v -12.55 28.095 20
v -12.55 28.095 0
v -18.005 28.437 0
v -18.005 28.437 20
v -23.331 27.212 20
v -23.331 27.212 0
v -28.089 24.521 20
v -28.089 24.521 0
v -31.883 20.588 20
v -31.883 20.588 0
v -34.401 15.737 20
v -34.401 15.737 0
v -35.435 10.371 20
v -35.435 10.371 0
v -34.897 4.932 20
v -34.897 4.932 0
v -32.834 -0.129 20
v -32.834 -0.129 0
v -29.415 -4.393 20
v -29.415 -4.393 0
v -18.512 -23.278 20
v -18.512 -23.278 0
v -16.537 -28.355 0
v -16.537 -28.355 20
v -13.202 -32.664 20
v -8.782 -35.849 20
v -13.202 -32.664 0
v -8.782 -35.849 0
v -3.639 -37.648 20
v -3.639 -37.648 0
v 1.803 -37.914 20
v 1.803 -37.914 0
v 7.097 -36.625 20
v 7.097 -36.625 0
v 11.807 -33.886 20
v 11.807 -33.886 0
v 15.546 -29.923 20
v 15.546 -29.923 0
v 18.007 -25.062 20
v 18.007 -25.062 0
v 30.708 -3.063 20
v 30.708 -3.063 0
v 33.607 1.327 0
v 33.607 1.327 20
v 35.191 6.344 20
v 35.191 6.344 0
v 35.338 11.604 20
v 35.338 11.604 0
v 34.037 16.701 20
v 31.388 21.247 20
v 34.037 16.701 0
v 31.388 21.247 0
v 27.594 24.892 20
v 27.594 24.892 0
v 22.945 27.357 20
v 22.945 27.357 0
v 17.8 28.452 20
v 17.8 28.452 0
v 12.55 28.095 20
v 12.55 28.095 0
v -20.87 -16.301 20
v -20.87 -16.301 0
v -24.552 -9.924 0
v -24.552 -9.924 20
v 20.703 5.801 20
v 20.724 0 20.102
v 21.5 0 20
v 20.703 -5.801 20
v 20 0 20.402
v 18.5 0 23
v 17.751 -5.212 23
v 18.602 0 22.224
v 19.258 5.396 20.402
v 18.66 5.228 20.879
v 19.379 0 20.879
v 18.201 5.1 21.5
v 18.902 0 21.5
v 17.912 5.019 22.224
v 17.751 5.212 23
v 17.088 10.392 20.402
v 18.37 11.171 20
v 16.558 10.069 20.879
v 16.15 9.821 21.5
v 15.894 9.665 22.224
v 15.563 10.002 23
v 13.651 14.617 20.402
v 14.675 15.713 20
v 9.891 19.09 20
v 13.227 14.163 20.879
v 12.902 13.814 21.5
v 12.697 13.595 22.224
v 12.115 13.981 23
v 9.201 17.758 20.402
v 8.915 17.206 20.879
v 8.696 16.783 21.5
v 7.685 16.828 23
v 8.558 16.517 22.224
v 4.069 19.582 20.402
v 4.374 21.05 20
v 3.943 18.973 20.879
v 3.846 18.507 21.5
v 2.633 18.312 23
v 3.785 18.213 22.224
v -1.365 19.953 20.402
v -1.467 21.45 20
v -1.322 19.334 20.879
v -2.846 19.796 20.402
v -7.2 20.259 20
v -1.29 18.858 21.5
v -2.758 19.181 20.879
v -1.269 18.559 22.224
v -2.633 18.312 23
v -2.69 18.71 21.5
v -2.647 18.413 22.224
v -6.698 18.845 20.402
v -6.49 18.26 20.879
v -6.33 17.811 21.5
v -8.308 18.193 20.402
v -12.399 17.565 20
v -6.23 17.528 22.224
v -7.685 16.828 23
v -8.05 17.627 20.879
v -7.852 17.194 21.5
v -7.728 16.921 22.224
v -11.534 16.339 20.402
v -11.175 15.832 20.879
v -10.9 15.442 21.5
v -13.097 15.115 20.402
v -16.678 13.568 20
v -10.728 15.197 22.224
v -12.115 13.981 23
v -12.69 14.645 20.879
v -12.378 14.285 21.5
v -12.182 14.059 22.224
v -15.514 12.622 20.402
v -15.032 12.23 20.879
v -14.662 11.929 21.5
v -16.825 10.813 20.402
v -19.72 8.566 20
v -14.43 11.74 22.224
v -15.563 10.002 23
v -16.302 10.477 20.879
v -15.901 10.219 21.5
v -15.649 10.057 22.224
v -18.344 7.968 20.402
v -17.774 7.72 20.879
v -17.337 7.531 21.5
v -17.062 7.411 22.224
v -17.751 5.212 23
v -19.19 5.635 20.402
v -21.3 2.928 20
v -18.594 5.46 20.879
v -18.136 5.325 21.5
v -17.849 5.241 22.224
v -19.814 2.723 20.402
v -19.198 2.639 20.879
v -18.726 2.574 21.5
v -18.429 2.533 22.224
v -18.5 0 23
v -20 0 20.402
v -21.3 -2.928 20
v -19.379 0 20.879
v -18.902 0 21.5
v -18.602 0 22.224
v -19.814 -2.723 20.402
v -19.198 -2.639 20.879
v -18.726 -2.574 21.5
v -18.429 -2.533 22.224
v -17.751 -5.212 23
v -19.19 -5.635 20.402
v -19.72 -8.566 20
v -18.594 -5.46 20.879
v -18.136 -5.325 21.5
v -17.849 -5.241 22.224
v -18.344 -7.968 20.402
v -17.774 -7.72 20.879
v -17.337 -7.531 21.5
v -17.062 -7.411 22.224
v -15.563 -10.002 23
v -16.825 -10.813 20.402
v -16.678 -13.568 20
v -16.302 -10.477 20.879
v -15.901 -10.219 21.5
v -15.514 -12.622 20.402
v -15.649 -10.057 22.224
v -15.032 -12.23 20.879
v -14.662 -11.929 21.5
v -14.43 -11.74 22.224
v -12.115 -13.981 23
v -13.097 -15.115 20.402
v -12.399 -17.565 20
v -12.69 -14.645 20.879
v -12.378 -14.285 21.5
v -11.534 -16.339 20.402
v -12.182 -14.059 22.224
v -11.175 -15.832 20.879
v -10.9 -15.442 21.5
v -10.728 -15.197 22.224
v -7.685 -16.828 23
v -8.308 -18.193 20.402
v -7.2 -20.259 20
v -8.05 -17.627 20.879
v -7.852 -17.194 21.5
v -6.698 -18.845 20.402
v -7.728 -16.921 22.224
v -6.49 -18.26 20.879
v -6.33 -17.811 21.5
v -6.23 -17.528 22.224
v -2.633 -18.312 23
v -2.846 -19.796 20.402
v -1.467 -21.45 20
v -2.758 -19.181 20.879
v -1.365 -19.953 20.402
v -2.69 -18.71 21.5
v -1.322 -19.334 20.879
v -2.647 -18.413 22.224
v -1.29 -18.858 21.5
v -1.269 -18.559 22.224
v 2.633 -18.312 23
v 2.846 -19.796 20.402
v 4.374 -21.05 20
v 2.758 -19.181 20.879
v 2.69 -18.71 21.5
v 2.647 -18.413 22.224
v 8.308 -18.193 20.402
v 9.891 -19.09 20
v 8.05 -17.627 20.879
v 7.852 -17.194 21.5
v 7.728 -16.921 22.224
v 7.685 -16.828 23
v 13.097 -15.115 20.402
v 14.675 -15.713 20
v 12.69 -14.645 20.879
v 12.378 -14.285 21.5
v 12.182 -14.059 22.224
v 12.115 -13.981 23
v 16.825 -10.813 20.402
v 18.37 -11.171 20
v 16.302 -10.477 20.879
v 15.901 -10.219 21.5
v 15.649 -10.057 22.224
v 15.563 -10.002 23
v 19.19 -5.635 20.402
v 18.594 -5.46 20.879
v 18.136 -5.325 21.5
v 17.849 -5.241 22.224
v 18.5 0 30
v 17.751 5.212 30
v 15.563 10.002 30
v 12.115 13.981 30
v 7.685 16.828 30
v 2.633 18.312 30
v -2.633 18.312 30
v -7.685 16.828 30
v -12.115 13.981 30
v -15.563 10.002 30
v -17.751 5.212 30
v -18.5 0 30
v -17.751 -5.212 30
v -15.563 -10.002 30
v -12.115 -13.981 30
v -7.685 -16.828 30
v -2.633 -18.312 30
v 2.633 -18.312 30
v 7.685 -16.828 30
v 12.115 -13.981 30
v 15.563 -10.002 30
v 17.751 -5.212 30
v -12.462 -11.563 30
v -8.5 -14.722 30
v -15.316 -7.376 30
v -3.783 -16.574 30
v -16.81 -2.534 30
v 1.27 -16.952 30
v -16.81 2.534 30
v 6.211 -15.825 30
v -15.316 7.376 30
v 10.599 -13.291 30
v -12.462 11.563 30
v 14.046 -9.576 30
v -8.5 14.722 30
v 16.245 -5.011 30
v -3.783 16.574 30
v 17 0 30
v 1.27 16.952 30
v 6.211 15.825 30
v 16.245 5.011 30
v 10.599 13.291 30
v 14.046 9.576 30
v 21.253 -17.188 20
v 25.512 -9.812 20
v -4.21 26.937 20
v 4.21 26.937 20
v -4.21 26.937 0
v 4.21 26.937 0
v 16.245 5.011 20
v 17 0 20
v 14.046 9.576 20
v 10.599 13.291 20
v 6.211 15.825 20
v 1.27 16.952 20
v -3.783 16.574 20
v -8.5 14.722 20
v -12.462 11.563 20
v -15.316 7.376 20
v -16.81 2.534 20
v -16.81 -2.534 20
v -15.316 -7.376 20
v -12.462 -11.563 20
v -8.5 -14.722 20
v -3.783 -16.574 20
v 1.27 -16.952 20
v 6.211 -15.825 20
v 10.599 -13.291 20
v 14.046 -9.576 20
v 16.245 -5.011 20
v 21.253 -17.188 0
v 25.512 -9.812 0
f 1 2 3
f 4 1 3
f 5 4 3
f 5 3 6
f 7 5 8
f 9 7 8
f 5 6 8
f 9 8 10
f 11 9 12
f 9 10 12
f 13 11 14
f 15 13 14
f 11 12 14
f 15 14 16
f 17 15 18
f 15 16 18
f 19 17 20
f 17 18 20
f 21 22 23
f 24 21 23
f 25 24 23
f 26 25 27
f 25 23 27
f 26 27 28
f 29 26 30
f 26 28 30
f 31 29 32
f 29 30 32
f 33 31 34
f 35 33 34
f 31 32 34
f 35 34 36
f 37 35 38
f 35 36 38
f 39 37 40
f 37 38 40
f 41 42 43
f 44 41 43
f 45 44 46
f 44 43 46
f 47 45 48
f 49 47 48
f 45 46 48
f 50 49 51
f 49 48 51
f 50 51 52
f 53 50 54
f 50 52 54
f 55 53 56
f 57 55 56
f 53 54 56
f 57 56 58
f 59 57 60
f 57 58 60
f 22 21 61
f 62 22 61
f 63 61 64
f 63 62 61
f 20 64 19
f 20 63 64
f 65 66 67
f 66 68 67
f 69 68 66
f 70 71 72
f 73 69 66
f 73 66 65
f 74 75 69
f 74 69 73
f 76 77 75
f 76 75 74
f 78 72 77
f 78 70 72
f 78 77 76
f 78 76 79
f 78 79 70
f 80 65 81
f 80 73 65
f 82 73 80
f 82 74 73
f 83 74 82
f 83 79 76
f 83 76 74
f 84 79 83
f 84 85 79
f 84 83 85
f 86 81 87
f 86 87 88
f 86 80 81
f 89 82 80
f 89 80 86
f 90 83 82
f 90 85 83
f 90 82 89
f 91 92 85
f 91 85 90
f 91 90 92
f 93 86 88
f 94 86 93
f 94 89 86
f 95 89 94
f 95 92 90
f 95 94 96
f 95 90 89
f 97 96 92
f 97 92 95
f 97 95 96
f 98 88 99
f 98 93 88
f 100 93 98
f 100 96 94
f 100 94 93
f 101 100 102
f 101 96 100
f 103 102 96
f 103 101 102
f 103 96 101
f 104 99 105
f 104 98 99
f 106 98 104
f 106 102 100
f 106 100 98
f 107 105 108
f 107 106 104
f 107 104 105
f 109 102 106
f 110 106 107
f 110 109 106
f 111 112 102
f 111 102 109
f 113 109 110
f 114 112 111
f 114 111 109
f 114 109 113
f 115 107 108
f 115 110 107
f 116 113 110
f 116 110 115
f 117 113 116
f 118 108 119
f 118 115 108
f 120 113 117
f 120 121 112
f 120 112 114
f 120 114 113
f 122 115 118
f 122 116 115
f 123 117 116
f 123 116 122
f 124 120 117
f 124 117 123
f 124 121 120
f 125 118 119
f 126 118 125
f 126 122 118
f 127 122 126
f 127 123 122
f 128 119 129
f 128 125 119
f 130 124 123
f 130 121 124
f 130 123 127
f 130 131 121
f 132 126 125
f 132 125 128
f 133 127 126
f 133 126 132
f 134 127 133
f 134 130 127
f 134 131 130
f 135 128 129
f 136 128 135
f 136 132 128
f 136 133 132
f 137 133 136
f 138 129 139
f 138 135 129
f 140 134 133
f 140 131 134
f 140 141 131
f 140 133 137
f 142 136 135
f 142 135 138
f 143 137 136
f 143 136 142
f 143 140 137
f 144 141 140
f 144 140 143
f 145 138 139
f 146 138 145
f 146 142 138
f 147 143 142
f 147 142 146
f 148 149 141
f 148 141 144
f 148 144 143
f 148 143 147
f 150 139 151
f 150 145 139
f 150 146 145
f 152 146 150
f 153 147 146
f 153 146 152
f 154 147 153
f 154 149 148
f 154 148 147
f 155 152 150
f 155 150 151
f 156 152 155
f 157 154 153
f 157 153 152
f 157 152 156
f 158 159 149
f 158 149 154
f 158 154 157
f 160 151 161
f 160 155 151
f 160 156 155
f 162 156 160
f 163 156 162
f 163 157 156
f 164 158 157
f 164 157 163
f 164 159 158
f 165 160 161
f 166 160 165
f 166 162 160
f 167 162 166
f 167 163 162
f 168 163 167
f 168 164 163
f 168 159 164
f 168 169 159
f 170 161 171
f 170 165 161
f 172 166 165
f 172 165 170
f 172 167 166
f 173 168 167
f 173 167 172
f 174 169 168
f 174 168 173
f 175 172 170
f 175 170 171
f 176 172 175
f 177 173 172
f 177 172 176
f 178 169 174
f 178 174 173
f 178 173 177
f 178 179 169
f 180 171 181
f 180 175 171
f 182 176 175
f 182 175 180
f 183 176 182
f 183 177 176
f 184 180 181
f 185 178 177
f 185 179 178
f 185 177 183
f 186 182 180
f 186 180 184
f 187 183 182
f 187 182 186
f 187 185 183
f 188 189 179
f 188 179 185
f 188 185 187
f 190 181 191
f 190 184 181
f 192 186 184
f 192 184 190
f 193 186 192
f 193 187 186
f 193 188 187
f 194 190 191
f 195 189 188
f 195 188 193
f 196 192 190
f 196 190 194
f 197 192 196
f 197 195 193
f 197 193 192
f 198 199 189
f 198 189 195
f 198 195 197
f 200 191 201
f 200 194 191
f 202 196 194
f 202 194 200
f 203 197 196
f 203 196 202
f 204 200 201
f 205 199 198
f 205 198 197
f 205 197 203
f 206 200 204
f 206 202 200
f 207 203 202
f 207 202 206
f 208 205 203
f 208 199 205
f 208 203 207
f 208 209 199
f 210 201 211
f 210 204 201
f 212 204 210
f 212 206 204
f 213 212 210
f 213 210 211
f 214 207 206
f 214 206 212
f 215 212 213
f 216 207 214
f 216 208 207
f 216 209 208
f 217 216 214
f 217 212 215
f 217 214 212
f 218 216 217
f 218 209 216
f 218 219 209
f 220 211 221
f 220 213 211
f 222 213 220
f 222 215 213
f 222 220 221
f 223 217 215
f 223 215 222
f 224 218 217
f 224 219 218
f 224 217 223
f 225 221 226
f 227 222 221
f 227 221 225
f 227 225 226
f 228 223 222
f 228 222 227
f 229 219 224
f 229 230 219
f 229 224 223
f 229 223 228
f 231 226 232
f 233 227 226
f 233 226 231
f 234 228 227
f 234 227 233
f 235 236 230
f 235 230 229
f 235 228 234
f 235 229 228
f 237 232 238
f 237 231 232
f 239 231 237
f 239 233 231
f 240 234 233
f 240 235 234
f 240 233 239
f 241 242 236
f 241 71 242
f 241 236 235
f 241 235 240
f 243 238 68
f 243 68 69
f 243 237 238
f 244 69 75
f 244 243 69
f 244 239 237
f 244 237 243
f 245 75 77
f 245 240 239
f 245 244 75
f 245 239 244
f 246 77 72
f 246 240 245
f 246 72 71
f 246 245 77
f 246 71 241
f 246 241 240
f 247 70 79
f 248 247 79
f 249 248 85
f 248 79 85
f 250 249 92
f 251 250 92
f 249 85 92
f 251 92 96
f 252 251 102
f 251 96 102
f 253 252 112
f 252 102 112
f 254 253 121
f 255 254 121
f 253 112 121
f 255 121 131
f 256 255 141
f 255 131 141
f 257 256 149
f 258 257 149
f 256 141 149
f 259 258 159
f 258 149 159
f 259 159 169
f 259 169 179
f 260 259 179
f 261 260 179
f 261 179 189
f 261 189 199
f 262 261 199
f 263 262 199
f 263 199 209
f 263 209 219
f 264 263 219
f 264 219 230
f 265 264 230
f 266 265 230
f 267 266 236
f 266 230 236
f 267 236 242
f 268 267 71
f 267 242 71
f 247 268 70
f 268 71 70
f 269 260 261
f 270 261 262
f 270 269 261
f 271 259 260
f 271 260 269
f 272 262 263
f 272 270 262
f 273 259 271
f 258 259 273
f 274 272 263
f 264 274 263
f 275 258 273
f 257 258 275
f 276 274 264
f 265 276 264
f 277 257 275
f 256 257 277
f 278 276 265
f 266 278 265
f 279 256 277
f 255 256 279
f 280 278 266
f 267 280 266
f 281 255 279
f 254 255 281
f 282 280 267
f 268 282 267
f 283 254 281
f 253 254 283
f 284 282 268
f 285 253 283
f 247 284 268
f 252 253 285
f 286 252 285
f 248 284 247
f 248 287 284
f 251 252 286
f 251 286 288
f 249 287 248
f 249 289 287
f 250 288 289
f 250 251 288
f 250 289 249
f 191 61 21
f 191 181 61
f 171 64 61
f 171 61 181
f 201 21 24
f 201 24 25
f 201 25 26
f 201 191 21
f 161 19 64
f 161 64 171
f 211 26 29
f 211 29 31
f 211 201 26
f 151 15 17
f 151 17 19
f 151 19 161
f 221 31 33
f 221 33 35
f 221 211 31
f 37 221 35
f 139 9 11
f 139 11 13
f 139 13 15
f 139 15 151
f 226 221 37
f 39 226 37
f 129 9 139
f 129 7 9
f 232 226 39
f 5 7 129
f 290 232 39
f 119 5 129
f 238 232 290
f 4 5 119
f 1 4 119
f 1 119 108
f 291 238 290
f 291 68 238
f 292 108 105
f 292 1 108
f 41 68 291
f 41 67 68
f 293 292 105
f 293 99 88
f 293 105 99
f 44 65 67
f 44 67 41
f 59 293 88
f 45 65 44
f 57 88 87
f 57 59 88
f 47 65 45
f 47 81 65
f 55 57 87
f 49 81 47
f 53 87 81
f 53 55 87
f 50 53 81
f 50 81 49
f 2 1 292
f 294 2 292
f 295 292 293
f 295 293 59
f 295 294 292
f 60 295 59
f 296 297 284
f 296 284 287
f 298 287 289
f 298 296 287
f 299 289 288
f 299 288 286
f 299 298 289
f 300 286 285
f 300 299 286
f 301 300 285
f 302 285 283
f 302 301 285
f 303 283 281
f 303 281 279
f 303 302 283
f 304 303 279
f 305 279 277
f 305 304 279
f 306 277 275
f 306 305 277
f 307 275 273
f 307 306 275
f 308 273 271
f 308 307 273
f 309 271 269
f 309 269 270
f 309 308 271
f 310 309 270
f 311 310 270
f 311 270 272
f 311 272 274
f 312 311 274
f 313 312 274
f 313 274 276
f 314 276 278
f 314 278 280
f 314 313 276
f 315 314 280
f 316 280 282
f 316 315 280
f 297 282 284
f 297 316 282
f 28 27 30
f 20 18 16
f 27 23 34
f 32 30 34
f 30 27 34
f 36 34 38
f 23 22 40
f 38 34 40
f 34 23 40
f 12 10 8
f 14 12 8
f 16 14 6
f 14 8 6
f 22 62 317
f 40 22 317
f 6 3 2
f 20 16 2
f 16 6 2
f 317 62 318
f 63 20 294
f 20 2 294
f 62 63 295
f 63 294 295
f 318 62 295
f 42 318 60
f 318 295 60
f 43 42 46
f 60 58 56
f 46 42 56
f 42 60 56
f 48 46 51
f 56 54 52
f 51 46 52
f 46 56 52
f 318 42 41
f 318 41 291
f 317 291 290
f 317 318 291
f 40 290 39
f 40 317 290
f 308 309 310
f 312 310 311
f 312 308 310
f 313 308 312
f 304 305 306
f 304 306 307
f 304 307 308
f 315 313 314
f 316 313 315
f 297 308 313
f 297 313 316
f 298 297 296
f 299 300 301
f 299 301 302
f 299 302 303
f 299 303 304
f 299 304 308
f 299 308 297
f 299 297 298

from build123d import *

# Parameters (mm, degrees)
PAD_DEPTH     = 20
SKETCH001_R   = 18.5
SKETCH001_R_2 = 17
PAD001_DEPTH  = 10
FILLET_R      = 3


with BuildPart() as part:
    # Sketch (on XY_Plane of Origin) → Pad (new body)
    with BuildSketch(Plane.XY):
        with BuildLine():
            ThreePointArc((30.707978, -3.063362), (32.870408, 19.066483), (12.550484, 28.094595))
            ThreePointArc((-12.550484, 28.094595), (0, 26.791295), (12.550484, 28.094595))
            ThreePointArc((-12.550484, 28.094595), (-33.317775, 18.253831), (-29.415109, -4.393248))
            ThreePointArc((-18.512219, -23.277607), (-22.553443, -13.021236), (-29.415109, -4.393248))
            ThreePointArc((-18.512219, -23.277607), (-0.927377, -37.977359), (18.006938, -25.062208))
            ThreePointArc((30.707978, -3.063362), (23.26018, -13.429271), (18.006938, -25.062208))
        make_face()
    extrude(amount=PAD_DEPTH)

    # Sketch001 (on Face8 of Pad) → Pad001 (join)
    with BuildSketch(Plane.XY.offset(20)):
        Circle(SKETCH001_R)
        Circle(SKETCH001_R_2, mode=Mode.SUBTRACT)
    extrude(amount=PAD001_DEPTH)

    # Fillet
    fillet_edges = [part.edges().sort_by_distance(p)[0] for p in [
        (-18.5, 0, 20),
    ]]
    fillet(fillet_edges, radius=FILLET_R)


solid = part.part
